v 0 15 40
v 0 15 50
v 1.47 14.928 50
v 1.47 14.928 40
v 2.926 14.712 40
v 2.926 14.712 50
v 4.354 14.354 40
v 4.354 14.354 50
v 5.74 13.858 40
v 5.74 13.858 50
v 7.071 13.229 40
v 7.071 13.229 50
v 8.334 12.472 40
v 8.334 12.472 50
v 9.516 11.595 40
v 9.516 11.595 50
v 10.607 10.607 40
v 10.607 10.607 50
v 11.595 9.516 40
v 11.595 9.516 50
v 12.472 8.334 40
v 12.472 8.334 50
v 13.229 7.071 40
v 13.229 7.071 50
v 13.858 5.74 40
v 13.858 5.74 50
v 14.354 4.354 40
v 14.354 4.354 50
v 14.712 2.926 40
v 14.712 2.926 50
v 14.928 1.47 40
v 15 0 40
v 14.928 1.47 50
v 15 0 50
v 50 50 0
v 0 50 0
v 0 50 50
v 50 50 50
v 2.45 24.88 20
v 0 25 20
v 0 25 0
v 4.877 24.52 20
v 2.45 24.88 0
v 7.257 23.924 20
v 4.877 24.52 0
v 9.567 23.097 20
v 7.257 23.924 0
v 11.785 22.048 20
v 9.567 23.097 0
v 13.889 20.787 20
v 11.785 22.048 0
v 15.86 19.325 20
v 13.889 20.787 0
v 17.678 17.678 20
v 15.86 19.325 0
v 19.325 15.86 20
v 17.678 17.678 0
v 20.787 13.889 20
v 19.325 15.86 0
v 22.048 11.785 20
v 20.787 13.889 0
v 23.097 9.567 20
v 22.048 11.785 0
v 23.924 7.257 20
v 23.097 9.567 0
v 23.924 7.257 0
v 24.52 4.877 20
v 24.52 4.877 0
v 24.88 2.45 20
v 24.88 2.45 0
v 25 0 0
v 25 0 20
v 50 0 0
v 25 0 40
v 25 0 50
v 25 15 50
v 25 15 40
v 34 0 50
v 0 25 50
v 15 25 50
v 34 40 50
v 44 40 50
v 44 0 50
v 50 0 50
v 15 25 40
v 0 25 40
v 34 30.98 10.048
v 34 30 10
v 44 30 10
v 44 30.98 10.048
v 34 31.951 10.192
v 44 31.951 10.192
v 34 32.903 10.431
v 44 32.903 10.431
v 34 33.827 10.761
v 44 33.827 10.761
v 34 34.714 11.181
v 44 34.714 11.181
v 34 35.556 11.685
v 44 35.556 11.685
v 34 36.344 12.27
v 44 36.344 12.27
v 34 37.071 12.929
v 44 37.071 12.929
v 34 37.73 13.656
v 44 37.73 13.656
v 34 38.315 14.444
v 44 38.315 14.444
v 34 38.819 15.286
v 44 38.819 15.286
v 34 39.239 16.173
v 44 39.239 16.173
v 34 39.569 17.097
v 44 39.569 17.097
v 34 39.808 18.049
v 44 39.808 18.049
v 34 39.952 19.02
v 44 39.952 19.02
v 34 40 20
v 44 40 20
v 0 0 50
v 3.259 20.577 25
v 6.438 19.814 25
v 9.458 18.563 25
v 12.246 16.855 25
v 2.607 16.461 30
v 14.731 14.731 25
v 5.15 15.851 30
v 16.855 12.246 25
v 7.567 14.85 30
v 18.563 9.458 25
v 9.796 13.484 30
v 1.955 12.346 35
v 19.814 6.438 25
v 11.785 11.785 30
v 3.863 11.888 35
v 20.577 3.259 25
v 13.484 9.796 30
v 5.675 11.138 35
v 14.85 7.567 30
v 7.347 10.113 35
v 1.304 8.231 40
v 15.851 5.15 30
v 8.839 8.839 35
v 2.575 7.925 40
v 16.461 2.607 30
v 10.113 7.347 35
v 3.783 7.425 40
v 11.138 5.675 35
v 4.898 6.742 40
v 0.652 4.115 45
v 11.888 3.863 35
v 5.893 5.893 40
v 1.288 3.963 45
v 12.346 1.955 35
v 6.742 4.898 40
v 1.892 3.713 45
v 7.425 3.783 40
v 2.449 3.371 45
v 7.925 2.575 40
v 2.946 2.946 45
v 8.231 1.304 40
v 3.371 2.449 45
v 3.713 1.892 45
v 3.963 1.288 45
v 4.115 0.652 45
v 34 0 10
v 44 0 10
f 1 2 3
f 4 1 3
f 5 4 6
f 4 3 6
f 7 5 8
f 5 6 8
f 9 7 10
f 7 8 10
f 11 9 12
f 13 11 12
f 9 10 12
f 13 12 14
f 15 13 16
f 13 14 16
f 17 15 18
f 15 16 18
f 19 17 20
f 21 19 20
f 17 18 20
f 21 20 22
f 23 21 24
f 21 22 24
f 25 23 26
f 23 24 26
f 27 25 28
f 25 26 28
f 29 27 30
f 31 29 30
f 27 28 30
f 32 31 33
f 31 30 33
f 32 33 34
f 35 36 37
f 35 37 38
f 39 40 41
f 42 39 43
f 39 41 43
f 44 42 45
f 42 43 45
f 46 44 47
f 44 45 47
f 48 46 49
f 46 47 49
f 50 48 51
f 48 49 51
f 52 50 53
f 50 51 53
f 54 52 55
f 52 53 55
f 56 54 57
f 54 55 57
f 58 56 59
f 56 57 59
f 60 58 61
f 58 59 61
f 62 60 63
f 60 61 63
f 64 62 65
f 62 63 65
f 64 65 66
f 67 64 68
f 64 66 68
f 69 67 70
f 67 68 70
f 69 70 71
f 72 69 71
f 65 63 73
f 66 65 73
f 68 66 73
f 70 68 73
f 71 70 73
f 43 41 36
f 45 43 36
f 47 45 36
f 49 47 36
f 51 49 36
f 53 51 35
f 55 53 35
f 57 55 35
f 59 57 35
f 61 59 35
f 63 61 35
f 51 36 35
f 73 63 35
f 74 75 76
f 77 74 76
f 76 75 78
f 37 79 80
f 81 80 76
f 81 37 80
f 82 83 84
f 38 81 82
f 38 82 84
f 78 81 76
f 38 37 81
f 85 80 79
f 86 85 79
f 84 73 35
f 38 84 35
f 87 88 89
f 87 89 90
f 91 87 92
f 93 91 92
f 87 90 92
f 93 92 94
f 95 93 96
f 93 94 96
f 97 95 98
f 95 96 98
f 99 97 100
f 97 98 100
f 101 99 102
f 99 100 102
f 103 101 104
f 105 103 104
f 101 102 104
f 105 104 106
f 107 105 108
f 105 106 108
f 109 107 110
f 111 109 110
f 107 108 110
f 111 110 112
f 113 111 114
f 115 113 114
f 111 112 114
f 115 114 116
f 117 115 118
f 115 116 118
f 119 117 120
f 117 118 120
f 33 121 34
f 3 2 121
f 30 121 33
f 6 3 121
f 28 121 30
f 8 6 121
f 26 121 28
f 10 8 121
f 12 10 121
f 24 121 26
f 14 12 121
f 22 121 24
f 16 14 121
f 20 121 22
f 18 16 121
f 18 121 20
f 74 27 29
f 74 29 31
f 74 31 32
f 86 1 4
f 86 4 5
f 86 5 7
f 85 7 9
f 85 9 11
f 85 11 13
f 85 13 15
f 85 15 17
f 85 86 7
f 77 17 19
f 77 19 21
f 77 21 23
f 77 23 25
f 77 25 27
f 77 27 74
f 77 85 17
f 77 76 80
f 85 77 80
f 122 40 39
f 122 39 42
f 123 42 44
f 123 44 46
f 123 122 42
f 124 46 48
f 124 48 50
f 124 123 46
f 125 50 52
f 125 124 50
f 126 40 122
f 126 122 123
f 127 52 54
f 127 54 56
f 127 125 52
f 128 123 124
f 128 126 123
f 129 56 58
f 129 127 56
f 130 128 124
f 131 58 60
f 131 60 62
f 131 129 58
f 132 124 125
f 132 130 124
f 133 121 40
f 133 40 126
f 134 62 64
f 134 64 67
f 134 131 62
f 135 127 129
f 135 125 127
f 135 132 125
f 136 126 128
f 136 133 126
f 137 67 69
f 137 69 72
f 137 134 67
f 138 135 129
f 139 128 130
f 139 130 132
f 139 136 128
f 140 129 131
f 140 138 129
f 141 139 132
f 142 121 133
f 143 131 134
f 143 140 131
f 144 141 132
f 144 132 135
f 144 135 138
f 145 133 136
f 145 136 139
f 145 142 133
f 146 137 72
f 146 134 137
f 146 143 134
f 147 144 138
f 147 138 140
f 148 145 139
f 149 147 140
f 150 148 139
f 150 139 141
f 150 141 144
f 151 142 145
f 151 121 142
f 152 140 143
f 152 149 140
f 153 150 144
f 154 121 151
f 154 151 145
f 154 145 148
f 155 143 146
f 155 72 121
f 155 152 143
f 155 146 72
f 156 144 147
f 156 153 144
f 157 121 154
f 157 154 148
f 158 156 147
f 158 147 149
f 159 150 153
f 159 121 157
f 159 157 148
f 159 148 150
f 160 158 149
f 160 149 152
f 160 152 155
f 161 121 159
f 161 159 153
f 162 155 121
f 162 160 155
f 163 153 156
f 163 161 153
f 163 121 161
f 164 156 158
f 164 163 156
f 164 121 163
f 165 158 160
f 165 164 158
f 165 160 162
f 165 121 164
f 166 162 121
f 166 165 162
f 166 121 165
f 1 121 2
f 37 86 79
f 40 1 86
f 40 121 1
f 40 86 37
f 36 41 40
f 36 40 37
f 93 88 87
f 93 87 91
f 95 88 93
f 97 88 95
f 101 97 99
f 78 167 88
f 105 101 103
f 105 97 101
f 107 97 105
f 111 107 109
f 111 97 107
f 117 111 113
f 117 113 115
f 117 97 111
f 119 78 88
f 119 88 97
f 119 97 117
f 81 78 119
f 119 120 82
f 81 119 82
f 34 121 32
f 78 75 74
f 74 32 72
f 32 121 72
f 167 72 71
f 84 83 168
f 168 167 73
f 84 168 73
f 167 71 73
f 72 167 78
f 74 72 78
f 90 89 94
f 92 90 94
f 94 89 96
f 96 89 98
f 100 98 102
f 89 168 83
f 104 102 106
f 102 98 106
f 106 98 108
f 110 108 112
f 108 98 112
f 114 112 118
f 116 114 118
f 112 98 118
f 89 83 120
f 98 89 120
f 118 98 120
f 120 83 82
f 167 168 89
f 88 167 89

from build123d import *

# Parameters (mm, degrees)
F0_W      = 50
F0_H      = 50
F1_DEPTH  = 50
F3_DEPTH  = 10
F4_R      = 25
F5_DEPTH  = 20
F11_DEPTH = 10


with BuildPart() as f1:
    # F0 (on Top) → F1 (new body)
    with BuildSketch(Plane.XY):
        with Locations((25, 25)):
            Rectangle(F0_W, F0_H)
    extrude(amount=F1_DEPTH)

    # F2 (on face) → F3 (cut)
    with BuildSketch(Plane.XY.offset(50)):
        with BuildLine():
            ThreePointArc((0, 15), (-10.6066017178, -10.6066017178), (15, 0))
            Line((15, 0), (0, 0))
            Line((0, 0), (0, 15))
        make_face()
        with BuildLine():
            ThreePointArc((0, 15), (10.6066017178, 10.6066017178), (15, 0))
            Line((15, 0), (25, 0))
            Line((25, 0), (25, 15.000000596))
            Line((25, 15.000000596), (15, 25))
            Line((15, 25), (0, 25))
            Line((0, 25), (0, 15))
        make_face()
    extrude(amount=-F3_DEPTH, mode=Mode.SUBTRACT)

    # F4 (on face) → F5 (cut)
    with BuildSketch(Plane(origin=(0, 0, 0), x_dir=(1, 0, 0), z_dir=(0, 0, -1))):
        Circle(F4_R)
    extrude(amount=-F5_DEPTH, mode=Mode.SUBTRACT)

    # F6 (on face) → F7 (revolve, cut)
    with BuildSketch(Plane.XZ):
        Polygon((25, 20), (0, 50), (0, 20), align=None)
    revolve(axis=Axis((0, 0, 35), (0, 0, -1)), mode=Mode.SUBTRACT)

    # F10 (on offset) → F11 (cut, through all)
    with BuildSketch(Plane.YZ.offset(44)):
        Polygon((0, 50), (0, 10), (30, 10), (30, 20), (40, 20), (40, 50), align=None)
        with BuildLine():
            Line((30, 20), (30, 10))
            ThreePointArc((30, 10), (37.0710678119, 12.9289321881), (40, 20))
            Line((40, 20), (30, 20))
        make_face()
    extrude(amount=-F11_DEPTH, mode=Mode.SUBTRACT)


solid = f1.part
